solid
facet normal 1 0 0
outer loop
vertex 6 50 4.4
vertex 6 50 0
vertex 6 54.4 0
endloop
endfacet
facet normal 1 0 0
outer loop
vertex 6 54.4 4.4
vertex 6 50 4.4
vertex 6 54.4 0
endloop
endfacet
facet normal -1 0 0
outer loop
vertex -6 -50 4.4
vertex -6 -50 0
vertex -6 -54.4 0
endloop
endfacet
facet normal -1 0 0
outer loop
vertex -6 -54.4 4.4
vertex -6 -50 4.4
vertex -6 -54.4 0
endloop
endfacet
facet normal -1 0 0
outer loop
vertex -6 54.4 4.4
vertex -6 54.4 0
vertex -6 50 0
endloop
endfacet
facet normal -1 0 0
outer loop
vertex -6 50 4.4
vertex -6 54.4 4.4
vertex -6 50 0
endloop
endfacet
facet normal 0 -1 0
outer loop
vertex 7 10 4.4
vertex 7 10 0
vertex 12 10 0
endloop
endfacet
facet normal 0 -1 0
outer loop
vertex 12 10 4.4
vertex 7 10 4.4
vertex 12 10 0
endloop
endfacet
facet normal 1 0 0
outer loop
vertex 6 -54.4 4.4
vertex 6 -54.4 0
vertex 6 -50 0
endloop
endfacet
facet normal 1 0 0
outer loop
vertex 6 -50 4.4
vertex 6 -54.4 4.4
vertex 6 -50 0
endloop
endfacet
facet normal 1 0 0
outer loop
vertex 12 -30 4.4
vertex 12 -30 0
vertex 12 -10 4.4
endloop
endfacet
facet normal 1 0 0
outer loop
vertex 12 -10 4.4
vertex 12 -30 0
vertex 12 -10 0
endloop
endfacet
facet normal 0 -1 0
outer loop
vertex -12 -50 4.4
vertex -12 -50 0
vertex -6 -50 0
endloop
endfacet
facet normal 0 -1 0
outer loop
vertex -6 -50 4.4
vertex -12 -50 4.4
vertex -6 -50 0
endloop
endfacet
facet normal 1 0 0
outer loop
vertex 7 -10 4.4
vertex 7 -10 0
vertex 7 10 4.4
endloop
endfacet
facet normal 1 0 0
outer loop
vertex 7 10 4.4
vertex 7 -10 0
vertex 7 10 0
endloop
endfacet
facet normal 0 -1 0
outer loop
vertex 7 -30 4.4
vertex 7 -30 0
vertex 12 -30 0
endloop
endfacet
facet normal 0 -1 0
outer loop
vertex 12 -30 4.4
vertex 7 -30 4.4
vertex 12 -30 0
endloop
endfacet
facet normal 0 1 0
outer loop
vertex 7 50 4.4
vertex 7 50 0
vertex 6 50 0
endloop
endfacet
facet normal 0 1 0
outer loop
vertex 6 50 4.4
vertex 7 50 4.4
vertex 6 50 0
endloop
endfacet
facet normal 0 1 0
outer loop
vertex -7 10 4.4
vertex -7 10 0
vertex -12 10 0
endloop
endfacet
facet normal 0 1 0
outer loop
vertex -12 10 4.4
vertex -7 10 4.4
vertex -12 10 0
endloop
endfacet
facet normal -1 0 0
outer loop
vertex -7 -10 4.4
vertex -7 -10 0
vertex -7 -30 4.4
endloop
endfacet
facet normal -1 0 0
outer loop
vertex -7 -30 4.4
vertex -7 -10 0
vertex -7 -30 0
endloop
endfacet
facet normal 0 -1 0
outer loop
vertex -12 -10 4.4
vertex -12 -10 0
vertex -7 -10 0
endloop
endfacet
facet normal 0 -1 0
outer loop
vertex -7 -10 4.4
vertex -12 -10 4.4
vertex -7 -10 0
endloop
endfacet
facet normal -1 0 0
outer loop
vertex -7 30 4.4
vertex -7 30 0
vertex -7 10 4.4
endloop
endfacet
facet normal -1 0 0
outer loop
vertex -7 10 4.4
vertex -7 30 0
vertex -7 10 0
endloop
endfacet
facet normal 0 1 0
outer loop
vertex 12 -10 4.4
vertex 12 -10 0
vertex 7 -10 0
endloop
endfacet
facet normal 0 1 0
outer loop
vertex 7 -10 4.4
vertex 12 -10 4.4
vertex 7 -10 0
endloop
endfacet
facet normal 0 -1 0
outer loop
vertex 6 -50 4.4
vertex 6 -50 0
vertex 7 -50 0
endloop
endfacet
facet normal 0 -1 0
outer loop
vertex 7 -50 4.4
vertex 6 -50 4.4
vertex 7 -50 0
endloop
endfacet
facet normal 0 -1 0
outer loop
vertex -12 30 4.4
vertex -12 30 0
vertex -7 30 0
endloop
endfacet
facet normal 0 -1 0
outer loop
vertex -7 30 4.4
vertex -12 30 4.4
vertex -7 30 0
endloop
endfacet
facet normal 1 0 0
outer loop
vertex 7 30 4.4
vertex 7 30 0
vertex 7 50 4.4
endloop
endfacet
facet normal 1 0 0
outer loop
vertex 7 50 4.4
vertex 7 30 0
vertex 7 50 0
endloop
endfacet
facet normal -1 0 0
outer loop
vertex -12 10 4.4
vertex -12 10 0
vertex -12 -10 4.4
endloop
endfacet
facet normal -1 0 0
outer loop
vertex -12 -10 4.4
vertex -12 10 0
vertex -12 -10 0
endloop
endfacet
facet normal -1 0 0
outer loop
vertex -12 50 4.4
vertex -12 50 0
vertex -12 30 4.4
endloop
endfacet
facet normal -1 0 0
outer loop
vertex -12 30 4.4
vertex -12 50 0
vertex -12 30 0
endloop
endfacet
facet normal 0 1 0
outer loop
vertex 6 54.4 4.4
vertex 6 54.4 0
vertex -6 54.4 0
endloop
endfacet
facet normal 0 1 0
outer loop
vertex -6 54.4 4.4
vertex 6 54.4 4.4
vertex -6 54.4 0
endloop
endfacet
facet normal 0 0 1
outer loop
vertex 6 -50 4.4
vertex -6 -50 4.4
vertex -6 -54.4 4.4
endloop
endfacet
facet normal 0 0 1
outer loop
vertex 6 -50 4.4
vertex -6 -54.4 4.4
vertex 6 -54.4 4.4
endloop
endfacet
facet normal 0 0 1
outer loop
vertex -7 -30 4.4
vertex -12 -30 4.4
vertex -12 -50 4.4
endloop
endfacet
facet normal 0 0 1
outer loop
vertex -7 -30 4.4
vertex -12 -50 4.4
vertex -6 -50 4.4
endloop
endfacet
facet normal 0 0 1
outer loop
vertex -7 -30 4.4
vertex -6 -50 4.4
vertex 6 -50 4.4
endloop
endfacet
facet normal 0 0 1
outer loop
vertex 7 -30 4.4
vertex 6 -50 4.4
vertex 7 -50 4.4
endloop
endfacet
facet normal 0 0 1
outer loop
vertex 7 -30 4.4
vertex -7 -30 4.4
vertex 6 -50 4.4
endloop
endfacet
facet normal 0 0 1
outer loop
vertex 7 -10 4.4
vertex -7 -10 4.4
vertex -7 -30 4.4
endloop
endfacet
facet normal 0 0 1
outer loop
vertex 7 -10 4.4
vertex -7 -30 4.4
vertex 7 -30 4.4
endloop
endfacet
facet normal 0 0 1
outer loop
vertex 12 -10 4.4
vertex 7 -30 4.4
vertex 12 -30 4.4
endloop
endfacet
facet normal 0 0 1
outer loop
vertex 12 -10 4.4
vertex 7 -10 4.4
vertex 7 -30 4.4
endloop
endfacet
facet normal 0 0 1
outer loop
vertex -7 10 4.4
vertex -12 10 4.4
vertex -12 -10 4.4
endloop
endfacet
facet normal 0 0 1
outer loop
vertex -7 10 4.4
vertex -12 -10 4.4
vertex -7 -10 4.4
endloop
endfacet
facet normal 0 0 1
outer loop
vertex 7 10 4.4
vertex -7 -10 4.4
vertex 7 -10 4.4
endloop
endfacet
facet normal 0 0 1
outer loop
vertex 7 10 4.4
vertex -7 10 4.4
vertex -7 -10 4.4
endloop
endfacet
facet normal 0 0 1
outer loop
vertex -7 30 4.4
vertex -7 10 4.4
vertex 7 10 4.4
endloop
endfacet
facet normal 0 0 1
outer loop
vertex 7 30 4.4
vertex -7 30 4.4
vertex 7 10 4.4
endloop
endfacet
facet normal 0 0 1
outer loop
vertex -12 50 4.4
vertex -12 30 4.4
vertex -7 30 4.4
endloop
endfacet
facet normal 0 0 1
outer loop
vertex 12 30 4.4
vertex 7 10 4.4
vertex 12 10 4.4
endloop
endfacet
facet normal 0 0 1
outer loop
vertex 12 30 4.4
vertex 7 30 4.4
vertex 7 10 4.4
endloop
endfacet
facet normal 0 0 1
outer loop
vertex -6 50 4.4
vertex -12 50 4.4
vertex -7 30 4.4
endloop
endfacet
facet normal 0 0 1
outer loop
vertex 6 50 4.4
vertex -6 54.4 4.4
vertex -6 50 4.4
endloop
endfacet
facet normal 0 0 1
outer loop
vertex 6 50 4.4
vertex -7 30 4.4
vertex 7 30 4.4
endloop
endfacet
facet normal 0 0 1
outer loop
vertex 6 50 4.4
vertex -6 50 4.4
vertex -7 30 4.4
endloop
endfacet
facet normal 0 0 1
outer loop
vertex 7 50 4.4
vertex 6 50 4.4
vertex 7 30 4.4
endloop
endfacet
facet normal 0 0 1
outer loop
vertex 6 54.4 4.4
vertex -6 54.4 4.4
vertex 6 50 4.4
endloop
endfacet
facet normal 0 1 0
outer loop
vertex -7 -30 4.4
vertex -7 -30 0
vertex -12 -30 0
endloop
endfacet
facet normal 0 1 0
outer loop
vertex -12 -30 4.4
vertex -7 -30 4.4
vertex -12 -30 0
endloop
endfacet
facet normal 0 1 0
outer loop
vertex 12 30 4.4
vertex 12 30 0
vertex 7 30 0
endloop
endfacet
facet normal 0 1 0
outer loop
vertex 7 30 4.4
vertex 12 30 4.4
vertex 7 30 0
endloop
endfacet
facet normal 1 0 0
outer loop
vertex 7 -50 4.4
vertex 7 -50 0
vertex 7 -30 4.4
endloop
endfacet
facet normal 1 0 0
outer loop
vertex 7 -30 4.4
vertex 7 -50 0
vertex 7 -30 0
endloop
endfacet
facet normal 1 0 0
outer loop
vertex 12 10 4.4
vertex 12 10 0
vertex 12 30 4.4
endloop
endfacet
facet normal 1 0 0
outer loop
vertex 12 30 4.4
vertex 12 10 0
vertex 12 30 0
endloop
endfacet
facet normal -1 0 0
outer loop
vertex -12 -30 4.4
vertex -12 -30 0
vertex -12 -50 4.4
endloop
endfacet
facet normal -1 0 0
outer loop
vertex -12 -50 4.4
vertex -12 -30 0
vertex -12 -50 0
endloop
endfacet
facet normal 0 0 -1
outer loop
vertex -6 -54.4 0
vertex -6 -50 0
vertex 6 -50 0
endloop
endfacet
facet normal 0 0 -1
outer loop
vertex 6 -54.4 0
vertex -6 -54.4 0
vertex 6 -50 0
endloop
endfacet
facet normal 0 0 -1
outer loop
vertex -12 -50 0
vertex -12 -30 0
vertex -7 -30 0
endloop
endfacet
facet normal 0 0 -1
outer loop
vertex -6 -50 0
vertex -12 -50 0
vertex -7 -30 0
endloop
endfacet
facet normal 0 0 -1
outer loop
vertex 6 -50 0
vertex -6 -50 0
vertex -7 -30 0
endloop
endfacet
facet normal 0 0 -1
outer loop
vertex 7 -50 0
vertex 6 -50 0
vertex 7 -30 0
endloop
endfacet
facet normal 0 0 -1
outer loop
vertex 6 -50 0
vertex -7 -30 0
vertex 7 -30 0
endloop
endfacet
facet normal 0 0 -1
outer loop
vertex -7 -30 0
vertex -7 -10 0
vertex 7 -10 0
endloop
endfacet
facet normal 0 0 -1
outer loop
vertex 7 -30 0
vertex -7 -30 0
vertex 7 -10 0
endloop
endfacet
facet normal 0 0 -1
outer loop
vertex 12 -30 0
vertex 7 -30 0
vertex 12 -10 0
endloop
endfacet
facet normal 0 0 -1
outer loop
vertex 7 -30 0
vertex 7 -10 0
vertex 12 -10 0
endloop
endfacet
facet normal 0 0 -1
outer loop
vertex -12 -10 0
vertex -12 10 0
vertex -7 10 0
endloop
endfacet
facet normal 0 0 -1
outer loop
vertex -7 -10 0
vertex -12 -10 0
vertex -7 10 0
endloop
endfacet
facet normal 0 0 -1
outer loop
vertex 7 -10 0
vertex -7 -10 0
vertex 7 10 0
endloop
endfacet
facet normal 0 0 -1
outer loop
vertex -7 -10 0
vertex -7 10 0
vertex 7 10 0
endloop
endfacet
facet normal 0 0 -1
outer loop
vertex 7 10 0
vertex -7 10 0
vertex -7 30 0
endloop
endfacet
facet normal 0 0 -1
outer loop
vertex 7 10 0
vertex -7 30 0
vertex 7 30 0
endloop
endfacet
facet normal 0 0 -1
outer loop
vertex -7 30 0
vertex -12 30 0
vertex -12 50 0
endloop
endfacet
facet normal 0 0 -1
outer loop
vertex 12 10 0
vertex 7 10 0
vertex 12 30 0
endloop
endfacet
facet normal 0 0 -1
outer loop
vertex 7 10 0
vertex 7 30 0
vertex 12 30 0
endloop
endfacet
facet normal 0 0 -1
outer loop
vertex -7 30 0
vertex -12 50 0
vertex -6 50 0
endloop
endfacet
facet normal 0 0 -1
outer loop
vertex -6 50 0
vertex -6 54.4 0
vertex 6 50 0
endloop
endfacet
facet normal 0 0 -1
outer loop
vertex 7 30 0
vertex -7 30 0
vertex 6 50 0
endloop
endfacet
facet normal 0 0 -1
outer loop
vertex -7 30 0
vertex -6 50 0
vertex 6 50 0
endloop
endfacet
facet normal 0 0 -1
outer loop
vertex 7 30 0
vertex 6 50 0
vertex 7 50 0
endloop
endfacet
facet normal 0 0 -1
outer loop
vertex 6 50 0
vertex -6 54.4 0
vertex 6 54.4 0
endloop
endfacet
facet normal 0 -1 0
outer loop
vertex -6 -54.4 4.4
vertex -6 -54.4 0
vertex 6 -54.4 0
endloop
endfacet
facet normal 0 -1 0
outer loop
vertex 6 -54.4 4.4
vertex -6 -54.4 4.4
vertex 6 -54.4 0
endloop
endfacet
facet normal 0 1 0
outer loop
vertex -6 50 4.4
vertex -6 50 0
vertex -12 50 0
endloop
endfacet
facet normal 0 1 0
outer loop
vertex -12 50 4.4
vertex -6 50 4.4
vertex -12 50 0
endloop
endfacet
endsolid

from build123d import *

# Parameters (mm, degrees)
EXTRUDE_1_DEPTH = 4.4


with BuildPart() as part:
    # 草图1 → 凸台-拉伸1 (new body)
    with BuildSketch(Plane.XY):
        Polygon((6, 50), (6, 54.4), (-6, 54.4), (-6, 50), (-7, 50), (-12, 50), (-12, 30), (-7, 30), (-7, 10), (-12, 10), (-12, -10), (-7, -10), (-7, -30), (-12, -30), (-12, -50), (-7, -50), (-6, -50), (-6, -54.4), (6, -54.4), (6, -50), (7, -50), (7, -30), (12, -30), (12, -10), (7, -10), (7, 10), (12, 10), (12, 30), (7, 30), (7, 50), align=None)
    extrude(amount=EXTRUDE_1_DEPTH)


solid = part.part
